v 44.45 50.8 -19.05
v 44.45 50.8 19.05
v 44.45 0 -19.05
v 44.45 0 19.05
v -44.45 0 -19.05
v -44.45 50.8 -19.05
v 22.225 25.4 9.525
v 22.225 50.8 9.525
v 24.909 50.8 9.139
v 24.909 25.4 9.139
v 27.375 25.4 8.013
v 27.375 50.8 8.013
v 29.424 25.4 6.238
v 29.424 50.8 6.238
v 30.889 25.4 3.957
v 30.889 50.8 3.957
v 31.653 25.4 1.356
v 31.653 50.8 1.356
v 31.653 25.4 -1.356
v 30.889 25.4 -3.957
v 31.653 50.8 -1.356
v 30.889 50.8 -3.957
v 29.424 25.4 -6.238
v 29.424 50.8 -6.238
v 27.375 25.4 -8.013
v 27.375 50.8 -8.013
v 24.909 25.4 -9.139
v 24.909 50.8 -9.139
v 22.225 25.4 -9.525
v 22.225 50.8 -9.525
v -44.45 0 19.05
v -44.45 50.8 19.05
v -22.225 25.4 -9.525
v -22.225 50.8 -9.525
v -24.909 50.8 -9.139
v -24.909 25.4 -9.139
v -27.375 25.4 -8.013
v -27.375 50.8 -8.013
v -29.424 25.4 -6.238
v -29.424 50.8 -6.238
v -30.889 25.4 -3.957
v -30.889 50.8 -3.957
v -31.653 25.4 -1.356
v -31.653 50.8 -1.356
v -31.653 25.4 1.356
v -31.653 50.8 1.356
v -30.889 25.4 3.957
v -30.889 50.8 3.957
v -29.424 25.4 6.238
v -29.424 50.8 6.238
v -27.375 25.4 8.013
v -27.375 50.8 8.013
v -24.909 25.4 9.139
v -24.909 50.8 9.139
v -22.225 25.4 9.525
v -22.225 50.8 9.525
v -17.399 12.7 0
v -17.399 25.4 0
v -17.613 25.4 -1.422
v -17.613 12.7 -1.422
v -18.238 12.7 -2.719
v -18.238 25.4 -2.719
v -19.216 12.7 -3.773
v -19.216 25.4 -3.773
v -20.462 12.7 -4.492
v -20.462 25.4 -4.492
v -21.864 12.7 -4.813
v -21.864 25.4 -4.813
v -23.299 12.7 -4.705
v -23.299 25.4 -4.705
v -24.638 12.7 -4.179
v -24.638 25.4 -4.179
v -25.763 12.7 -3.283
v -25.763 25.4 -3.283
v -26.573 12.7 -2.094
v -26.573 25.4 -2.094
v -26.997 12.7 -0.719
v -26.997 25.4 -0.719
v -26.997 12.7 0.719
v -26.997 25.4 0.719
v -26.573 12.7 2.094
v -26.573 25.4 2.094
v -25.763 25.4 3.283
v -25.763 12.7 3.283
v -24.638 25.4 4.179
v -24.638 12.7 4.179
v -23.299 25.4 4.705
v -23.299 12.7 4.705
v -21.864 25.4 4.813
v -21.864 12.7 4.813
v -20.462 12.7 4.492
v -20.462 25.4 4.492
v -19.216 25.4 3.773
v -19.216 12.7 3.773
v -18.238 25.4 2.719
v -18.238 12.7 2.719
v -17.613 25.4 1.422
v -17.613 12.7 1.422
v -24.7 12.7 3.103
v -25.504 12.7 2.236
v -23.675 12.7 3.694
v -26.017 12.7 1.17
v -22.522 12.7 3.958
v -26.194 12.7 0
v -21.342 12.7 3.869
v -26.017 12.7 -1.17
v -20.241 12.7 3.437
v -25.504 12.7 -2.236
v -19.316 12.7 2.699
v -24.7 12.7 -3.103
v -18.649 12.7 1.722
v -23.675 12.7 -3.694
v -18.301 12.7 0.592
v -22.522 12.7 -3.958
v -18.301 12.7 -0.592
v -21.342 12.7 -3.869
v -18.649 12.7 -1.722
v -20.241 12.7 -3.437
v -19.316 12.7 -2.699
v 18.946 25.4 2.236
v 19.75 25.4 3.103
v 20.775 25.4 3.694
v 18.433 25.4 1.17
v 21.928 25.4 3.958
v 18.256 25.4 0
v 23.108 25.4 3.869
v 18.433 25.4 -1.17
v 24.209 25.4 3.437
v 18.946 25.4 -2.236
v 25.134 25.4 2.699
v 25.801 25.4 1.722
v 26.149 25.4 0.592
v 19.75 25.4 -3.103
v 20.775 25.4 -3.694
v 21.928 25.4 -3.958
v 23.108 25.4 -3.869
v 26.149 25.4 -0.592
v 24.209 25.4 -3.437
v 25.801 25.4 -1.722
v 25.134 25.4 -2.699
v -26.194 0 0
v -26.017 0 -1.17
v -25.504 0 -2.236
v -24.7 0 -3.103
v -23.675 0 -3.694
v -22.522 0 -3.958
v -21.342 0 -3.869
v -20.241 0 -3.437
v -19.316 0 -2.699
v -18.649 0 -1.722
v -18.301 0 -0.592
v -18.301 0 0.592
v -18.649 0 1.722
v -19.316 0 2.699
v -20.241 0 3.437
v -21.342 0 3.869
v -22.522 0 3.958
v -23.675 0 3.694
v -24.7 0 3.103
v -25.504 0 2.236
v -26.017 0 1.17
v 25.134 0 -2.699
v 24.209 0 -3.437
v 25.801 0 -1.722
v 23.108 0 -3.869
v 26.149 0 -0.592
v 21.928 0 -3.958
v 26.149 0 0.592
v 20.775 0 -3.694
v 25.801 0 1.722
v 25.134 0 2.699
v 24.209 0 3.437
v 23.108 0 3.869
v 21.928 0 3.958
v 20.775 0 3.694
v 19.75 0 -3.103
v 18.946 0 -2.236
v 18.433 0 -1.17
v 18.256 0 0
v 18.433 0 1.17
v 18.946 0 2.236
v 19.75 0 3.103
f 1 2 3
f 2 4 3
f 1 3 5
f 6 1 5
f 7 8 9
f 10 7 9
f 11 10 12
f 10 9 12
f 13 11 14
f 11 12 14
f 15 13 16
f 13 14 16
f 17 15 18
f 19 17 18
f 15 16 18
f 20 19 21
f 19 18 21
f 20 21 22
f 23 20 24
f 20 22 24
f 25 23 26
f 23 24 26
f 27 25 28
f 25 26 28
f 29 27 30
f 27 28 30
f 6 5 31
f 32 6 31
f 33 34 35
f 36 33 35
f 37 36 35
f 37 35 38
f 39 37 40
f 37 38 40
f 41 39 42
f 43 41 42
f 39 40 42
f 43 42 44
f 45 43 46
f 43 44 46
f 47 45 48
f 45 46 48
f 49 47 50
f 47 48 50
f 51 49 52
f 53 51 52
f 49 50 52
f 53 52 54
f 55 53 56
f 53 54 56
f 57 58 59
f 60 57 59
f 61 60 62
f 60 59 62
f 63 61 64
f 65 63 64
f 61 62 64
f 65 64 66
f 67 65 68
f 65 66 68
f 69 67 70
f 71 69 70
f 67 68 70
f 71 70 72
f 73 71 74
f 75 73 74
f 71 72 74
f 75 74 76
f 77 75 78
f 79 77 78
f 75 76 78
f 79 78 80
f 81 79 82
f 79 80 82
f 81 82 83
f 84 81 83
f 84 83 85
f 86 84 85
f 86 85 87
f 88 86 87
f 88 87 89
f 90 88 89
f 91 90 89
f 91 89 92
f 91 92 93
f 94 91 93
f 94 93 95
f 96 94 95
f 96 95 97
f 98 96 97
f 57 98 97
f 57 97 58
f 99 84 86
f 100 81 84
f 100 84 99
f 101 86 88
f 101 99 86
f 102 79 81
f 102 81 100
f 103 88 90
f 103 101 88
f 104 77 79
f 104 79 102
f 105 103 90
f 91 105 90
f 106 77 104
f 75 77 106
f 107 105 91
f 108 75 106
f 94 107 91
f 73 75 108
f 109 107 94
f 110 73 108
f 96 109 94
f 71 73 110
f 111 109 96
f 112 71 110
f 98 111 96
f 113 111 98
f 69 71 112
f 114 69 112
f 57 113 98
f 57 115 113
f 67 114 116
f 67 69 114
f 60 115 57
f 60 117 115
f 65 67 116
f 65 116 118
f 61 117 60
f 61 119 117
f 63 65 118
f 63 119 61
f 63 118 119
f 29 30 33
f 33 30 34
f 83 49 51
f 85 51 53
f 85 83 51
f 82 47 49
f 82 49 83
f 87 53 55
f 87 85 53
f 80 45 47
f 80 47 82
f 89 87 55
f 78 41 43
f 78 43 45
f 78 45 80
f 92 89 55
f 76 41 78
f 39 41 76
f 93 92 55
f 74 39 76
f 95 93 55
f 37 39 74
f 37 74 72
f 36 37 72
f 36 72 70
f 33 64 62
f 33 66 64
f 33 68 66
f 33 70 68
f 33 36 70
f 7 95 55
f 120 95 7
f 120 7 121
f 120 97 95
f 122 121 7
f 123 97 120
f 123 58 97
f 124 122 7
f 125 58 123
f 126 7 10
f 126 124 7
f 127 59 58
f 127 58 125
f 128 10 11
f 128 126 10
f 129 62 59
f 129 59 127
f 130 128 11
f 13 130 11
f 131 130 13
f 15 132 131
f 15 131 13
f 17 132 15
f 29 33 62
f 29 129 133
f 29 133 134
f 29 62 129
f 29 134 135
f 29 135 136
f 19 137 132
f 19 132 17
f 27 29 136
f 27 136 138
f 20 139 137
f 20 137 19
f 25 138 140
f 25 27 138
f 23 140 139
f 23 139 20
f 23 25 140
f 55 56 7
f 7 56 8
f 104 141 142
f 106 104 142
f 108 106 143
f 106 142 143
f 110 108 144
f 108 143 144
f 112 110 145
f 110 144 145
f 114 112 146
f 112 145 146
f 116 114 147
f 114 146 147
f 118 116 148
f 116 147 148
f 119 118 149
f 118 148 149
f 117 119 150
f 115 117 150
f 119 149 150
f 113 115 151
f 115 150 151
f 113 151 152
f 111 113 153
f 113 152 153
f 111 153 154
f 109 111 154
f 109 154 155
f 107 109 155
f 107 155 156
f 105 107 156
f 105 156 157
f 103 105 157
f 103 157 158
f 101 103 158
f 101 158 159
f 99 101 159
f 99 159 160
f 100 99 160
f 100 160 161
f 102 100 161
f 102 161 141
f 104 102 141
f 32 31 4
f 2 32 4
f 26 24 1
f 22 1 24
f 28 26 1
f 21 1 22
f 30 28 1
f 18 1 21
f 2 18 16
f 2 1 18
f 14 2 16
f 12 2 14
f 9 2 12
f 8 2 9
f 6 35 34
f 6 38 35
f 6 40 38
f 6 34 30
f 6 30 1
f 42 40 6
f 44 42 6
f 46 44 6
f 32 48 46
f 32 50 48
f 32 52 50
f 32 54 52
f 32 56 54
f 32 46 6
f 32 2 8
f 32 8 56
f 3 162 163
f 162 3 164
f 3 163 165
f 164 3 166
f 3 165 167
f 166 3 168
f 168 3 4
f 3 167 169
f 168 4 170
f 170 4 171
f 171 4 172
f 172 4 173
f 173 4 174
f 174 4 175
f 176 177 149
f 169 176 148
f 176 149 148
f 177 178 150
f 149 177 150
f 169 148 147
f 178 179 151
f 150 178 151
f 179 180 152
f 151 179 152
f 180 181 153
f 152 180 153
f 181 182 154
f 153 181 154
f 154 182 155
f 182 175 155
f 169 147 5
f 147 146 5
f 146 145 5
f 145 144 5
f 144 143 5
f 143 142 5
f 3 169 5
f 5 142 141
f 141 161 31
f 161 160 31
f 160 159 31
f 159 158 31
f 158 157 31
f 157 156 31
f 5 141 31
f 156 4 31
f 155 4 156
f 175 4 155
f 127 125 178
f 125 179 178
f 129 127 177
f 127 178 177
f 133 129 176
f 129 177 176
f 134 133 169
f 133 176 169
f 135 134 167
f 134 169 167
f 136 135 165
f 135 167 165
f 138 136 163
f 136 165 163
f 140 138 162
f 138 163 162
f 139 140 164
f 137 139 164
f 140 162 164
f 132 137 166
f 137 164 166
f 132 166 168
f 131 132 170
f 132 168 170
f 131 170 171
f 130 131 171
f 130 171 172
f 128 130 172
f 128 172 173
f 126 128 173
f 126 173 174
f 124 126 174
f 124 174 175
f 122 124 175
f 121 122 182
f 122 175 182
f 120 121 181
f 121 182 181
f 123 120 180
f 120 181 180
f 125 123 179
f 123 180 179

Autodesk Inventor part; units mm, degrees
ref_plane "YZ Plane" through (0, 0, 0) normal (1, 0, 0) x (0, 1, 0)
ref_plane "XZ Plane" through (0, 0, 0) normal (0, 1, 0) x (-1, 0, 0)
ref_plane "XY Plane" through (0, 0, 0) normal (0, 0, 1) x (1, 0, 0)
sketch "Sketch1" plane through (0, 0, 0) normal (0, 1, 0) x (-1, 0, 0)
  line L0 (-44.45, -19.05) -> (44.45, -19.05)
  line L1 (44.45, -19.05) -> (44.45, 19.05)
  line L2 (44.45, 19.05) -> (-44.45, 19.05)
  line L3 (-44.45, 19.05) -> (-44.45, -19.05)
  line L4 (-44.45, -19.05) -> (44.45, 19.05) construction
  line L5 (44.45, -19.05) -> (-44.45, 19.05) construction
  circle A0 centre (22.225, 0) radius 3.9688
  circle A1 centre (-22.225, 0) radius 3.9688
  circle A2 centre (22.225, 0) radius 12.7
  circle A3 centre (-22.225, 0) radius 12.7
  point P0 (0, 0)
  point P1 (0, 0)
  point P2 (0, 0)
  dimension "d3" = 38.1
  dimension "d4" = 88.9
  dimension "d20" = 7.9375
  dimension "d21" = 25.4
  dimension "d22" = 22.225
  dimension "d23" = 22.225
extrude "Extrusion5" add sketch "Sketch1" along normal blind 50.8 contours L3 L2 L1 L0 | A2 | A3
sketch "Sketch10" plane through (0, 50.8, 0) normal (0, 1, 0) x (1, 0, 0)
  circle A0 centre (22.225, 0) radius 3.9687 projected
  circle A1 centre (-22.225, 0) radius 3.9687 projected
  line L0 (44.45, 19.05) -> (-44.45, 19.05) projected
  line L1 (-44.45, 19.05) -> (-44.45, -19.05) projected
  line L2 (-44.45, -19.05) -> (44.45, -19.05) projected
  line L3 (44.45, -19.05) -> (44.45, 19.05) projected
  circle A2 centre (-22.225, 0) radius 4.826
  circle A3 centre (-22.225, 0) radius 9.525
  point P0 (0, 0)
  dimension "d38" = 9.652
  dimension "d41" = 19.05
extrude "Extrusion8" cut sketch "Sketch10" against normal blind 38.1 contours A2
extrude "Extrusion9" cut sketch "Sketch10" against normal blind 25.4 contours A3
sketch "Sketch12" plane through (0, 50.8, 0) normal (0, 1, 0) x (1, 0, 0)
  circle A0 centre (-22.225, 0) radius 9.525 projected
  circle A1 centre (22.225, 0) radius 3.9687 projected
  line L0 (44.45, 19.05) -> (-44.45, 19.05) projected
  line L1 (-44.45, 19.05) -> (-44.45, -19.05) projected
  line L2 (-44.45, -19.05) -> (44.45, -19.05) projected
  line L3 (44.45, -19.05) -> (44.45, 19.05) projected
  circle A2 centre (-22.225, 0) radius 3.9687 projected
  line L4 (-22.225, 0) -> (22.225, 0) construction
  line L5 (-22.225, -9.525) -> (22.225, -9.525)
  line L6 (22.225, 9.525) -> (-22.225, 9.525)
  arc A3 (-22.225, 9.525) -> (-22.225, -9.525) centre (-22.225, 0) ccw
  arc A4 (22.225, -9.525) -> (22.225, 9.525) centre (22.225, 0) ccw
  point P0 (0, 0)
  point P1 (0, 0)
extrude "Extrusion10" cut sketch "Sketch12" against normal up to surface (25.4 mm away) contours A0 | A0 L6 A4 L5
equation "\"d23\" = d22"
properties part number "AirPressureAndValvePart2"
